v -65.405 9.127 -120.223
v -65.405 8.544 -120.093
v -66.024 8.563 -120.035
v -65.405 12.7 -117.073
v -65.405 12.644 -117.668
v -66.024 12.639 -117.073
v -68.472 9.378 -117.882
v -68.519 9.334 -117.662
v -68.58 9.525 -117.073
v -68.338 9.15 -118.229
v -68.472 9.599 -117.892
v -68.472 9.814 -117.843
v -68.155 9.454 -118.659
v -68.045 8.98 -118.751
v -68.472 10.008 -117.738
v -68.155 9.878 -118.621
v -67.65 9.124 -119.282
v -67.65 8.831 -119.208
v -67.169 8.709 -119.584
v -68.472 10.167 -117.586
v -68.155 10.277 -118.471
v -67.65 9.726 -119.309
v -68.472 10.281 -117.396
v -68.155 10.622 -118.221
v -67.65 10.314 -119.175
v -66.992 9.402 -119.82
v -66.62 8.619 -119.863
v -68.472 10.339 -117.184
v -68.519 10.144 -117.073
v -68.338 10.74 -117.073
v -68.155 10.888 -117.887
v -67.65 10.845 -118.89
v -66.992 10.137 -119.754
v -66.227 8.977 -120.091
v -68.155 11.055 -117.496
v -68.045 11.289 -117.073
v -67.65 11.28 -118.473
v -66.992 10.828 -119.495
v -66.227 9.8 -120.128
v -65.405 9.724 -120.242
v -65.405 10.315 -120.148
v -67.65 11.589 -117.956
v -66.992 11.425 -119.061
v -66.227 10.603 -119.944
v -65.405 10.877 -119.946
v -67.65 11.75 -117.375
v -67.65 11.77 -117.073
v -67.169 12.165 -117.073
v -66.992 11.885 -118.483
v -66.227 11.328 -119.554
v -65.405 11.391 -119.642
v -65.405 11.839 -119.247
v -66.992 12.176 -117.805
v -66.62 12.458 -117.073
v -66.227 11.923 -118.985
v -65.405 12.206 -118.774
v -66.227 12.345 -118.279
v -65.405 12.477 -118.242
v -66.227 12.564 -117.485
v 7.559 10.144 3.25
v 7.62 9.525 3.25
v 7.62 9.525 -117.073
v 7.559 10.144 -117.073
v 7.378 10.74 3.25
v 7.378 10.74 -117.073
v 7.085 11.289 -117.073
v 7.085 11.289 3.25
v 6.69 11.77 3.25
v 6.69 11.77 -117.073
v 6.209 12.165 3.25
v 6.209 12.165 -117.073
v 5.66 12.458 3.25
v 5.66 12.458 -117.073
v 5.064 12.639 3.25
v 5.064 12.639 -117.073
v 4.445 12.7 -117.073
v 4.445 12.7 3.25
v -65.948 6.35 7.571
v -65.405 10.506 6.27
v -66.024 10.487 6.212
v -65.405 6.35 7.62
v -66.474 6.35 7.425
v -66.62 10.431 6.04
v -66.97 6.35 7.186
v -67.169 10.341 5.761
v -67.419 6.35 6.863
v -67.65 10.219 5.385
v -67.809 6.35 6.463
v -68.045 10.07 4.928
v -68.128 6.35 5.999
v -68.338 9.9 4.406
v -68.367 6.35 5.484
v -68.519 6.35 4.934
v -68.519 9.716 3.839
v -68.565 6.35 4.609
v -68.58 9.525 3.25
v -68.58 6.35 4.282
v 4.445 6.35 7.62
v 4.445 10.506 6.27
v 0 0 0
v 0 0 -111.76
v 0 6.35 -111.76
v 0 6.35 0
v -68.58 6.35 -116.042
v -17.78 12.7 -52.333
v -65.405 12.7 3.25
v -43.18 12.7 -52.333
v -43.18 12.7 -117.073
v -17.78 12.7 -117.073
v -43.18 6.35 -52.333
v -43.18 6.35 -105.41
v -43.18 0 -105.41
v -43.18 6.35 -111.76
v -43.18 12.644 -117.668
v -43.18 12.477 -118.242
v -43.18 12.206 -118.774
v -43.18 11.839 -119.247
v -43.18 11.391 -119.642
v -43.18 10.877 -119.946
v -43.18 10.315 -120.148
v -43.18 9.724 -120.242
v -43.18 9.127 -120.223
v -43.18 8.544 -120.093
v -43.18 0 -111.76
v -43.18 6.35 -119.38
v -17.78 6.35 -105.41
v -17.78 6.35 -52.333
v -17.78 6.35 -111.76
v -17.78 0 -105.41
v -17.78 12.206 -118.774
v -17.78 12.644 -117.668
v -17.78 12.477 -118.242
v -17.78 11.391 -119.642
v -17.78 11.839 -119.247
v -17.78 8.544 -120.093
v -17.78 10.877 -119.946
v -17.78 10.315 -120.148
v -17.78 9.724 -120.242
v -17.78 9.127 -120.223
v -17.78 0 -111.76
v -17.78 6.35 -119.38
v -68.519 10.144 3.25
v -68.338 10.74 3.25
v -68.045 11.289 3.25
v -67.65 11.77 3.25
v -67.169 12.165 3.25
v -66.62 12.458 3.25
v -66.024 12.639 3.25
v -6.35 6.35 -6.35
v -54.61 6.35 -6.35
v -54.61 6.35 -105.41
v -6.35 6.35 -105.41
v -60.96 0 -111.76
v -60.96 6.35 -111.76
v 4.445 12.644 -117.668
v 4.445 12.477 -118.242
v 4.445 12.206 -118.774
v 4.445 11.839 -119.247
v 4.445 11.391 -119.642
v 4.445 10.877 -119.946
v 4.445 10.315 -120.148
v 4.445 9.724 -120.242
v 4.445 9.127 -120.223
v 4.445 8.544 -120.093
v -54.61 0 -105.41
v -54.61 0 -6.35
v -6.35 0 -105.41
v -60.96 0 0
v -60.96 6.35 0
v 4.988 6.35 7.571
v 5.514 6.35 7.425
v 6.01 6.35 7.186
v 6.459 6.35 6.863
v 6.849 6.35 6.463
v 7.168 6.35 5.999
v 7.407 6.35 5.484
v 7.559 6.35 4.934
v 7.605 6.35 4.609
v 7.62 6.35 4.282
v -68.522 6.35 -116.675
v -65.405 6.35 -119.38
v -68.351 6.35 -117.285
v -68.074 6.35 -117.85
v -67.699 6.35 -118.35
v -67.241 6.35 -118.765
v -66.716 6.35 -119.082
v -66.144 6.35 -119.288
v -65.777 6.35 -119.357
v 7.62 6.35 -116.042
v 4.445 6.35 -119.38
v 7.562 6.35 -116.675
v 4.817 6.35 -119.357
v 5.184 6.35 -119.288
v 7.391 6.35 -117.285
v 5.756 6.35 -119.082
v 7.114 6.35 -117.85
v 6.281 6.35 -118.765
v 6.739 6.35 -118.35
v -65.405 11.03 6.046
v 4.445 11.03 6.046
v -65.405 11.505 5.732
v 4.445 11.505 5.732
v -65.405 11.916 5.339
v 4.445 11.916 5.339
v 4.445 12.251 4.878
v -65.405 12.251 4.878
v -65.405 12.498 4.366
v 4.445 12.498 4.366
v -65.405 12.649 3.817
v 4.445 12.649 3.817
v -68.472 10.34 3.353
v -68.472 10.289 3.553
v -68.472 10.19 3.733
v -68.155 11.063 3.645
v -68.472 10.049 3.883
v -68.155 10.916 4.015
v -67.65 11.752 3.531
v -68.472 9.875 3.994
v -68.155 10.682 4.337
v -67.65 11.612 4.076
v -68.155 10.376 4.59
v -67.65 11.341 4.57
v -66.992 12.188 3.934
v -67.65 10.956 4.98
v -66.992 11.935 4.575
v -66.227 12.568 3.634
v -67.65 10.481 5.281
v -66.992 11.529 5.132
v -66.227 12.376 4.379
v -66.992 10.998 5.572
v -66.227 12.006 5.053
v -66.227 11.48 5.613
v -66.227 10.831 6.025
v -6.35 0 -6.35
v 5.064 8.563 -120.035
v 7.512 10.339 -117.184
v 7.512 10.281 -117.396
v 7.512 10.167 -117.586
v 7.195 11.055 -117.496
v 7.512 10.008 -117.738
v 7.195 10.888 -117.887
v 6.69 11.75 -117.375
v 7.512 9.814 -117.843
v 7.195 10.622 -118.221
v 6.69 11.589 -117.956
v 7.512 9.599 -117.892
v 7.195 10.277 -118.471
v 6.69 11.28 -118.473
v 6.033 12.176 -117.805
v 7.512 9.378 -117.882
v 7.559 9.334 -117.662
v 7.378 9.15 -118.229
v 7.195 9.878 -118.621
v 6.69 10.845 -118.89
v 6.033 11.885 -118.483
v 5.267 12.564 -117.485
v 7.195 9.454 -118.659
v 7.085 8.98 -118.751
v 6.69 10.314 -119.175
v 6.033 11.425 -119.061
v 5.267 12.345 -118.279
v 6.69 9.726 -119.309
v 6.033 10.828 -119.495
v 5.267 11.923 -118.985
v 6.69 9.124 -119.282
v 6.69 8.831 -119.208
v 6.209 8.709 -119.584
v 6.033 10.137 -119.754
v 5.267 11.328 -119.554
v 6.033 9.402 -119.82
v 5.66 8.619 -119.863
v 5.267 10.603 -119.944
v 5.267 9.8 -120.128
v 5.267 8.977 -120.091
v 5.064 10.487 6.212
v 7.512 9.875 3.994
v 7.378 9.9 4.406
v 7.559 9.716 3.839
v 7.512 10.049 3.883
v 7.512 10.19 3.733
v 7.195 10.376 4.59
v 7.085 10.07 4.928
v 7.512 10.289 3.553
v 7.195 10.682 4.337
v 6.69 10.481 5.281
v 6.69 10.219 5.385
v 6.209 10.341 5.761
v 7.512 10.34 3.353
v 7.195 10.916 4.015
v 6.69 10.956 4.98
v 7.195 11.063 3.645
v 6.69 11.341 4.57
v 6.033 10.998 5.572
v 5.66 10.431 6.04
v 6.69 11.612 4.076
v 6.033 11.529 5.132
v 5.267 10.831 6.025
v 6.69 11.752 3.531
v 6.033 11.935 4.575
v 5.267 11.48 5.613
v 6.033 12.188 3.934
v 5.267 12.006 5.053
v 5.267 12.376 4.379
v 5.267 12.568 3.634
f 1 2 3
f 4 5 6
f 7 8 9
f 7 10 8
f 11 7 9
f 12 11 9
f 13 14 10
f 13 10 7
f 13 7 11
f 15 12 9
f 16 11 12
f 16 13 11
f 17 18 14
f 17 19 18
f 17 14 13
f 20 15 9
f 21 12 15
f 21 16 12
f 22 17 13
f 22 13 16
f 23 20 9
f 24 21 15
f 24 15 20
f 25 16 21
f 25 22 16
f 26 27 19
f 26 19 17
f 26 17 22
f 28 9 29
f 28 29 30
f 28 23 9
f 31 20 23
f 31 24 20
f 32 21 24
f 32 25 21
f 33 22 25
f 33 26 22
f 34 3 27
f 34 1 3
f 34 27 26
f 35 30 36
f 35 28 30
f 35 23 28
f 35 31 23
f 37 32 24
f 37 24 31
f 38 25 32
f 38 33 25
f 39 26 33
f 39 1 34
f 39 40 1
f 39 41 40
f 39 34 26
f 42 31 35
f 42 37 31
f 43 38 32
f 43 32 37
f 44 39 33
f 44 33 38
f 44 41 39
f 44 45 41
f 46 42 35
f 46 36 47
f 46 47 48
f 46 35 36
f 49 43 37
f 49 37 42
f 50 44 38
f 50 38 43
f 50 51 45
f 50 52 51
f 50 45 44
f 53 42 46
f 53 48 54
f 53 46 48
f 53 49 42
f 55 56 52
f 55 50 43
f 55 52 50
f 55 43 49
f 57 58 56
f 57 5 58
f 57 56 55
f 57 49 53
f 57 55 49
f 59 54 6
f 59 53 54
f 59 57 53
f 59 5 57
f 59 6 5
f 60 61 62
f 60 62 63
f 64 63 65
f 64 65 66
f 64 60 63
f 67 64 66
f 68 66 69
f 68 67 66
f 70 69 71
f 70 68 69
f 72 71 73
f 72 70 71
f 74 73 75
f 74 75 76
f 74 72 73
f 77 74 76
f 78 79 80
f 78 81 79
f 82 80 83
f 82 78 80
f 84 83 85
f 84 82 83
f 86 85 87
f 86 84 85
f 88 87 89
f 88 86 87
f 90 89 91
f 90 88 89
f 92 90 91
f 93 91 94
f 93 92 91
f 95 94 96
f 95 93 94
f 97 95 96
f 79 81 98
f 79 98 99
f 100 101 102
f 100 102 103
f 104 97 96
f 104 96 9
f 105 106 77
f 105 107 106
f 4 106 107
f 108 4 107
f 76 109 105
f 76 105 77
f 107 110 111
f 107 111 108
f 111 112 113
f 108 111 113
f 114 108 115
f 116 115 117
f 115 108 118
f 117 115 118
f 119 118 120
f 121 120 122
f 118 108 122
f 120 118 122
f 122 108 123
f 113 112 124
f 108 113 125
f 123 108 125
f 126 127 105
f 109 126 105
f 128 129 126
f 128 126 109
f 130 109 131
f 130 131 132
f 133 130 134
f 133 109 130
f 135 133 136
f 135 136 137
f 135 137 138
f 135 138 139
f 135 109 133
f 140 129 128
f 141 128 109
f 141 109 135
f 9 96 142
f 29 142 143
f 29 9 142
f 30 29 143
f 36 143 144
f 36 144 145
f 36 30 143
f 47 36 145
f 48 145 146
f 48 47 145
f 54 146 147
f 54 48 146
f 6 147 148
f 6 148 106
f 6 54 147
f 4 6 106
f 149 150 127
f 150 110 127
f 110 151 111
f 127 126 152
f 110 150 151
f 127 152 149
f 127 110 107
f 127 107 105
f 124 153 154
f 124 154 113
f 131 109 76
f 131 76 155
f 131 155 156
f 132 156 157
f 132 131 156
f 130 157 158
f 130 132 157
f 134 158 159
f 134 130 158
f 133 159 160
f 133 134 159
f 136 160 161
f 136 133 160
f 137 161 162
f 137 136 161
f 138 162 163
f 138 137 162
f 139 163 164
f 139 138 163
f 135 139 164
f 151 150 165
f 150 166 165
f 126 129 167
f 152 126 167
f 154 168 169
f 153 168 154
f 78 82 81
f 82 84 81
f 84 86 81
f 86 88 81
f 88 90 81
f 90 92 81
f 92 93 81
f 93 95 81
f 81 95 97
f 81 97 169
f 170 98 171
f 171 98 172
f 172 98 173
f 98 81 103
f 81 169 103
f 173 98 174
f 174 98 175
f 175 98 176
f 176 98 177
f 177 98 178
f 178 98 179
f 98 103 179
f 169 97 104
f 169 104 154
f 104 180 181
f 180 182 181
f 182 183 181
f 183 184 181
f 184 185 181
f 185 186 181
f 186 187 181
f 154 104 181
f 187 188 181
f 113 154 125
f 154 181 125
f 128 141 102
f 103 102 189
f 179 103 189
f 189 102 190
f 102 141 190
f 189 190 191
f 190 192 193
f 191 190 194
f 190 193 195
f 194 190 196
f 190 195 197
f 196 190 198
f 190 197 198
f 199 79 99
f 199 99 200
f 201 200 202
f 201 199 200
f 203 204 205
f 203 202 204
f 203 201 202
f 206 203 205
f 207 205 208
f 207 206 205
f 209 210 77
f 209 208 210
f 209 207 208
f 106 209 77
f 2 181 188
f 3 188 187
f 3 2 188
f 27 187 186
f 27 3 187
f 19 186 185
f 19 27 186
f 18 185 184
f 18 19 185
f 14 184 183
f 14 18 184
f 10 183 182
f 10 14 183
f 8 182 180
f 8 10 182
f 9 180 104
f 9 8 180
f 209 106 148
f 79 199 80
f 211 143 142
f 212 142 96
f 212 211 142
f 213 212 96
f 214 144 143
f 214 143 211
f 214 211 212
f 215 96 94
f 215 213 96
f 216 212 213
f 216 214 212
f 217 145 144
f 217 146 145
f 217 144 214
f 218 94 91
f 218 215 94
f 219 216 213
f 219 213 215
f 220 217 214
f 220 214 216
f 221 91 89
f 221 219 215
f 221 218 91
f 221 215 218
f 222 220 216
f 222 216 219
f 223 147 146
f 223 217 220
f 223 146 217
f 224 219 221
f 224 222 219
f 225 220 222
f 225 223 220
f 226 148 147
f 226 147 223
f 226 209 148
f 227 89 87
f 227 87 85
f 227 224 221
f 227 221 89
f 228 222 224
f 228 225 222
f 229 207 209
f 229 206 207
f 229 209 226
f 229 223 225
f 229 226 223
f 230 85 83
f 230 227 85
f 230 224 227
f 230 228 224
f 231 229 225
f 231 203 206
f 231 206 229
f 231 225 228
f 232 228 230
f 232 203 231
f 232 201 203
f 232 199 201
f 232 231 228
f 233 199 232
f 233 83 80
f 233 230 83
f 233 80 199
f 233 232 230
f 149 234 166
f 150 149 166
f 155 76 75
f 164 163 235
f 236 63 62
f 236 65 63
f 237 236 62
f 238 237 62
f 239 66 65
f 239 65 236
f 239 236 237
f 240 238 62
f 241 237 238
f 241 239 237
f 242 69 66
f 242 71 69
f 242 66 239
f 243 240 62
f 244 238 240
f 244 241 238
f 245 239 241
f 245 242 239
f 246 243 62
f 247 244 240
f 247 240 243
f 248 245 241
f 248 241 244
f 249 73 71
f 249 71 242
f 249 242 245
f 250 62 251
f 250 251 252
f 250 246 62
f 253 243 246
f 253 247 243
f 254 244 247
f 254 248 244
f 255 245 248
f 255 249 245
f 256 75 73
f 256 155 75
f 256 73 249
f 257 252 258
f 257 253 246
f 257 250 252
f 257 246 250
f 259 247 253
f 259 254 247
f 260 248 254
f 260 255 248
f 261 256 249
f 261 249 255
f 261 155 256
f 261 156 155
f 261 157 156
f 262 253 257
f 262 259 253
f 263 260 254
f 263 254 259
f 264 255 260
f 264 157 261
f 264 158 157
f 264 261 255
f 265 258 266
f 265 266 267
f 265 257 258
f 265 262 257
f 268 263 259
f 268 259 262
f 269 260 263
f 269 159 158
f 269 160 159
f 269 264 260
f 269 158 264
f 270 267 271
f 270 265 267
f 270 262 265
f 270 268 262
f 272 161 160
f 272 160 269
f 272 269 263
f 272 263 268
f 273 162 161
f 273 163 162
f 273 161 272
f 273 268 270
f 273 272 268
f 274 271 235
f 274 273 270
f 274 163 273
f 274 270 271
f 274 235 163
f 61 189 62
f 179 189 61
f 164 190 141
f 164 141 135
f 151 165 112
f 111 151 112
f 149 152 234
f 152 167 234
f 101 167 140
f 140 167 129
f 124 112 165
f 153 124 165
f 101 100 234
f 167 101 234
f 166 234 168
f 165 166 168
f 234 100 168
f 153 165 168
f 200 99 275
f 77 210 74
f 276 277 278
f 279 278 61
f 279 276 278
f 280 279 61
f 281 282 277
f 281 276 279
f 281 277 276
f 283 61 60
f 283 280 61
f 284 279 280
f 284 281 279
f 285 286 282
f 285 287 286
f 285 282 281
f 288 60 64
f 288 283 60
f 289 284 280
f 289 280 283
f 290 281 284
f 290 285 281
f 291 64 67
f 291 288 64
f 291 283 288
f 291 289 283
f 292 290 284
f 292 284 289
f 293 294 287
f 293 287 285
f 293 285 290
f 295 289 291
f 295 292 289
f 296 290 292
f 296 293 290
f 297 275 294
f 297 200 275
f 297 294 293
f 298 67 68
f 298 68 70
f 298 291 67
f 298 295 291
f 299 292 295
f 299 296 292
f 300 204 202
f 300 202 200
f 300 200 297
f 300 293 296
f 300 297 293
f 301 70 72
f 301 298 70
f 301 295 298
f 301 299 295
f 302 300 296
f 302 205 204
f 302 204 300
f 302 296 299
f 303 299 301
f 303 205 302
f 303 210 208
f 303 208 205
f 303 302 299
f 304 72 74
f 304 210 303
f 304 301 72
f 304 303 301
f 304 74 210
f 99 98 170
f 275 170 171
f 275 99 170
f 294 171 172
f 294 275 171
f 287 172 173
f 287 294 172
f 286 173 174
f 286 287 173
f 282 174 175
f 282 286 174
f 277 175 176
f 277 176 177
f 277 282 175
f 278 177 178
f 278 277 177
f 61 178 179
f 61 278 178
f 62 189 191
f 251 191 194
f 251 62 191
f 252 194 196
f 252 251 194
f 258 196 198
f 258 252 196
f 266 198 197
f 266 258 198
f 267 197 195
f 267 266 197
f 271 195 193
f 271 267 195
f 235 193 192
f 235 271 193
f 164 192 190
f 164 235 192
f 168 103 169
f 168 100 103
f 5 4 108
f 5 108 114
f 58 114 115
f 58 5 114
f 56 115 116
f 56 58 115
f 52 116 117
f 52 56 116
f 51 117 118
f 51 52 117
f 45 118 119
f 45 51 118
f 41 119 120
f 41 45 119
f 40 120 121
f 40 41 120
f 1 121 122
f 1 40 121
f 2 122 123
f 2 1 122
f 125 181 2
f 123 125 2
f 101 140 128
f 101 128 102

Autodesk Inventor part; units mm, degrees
ref_plane "YZ Plane" through (0, 0, 0) normal (1, 0, 0) x (0, 1, 0)
ref_plane "XZ Plane" through (0, 0, 0) normal (0, 1, 0) x (-1, 0, 0)
ref_plane "XY Plane" through (0, 0, 0) normal (0, 0, 1) x (1, 0, 0)
sketch "Sketch1" plane through (0, 0, 0) normal (0, 1, 0) x (-1, 0, 0)
  line L0 (0, 0) -> (60.96, 0)
  line L1 (60.96, 0) -> (60.96, -111.76)
  line L2 (60.96, -111.76) -> (0, -111.76)
  line L3 (0, -111.76) -> (0, 0)
  dimension "d0" = 60.96
  dimension "d1" = 111.76
extrude "Extrusion1" add sketch "Sketch1" along normal blind 6.35
sketch "Sketch2" plane through (0, 6.35, 0) normal (0, 1, 0) x (1, 0, 0)
  line L0 (-60.96, 0) -> (0, 0) projected
  line L1 (0, 0) -> (0, 111.76) projected
  line L2 (0, 111.76) -> (-60.96, 111.76) projected
  line L3 (-60.96, 111.76) -> (-60.96, 0) projected
  line L4 (7.62, -7.62) -> (-68.58, -7.62)
  line L5 (-68.58, -7.62) -> (-68.58, 119.38)
  line L6 (-68.58, 119.38) -> (7.62, 119.38)
  line L7 (7.62, 119.38) -> (7.62, -7.62)
  dimension "d4" = 7.62
extrude "Extrusion2" add sketch "Sketch2" along normal blind 6.35 contours L3 L2 L1 L0 | L4 L5 L6 L7
sketch "Sketch3" plane through (7.62, 6.35, 7.62) normal (1, 0, 0) x (0, 0, -1)
  line L0 (127, 0) -> (127, 6.35) projected
  line L1 (127, 0) -> (129.0632, 6.35)
  line L2 (127, 0) -> (136.5189, 0) construction
  line L3 (127, 6.35) -> (129.0632, 6.35)
  line L4 (0, 0) -> (0, 6.35) projected
  line L5 (0, 0) -> (2.0632, 6.35)
  line L6 (127, 6.35) -> (0, 6.35) projected
  line L7 (127, 0) -> (0, 0) projected
  line L8 (127, 0) -> (127, 6.35) projected
  line L9 (0, 6.35) -> (127, 6.35) projected
  line L10 (0, 0) -> (0, 6.35) projected
  point P0 (7.62, -6.35)
  dimension "d7" = 72
extrude "Extrusion3" add sketch "Sketch3" against normal blind 76.2 contours L0 L3 L1 | L4 L6 L5
sketch "Sketch4" plane through (7.62, 6.35, 7.62) normal (1, 0, 0) x (0, 0, -1)
  line L0 (0, 0) -> (2.0632, 6.35)
  line L1 (0, 0) -> (11.0448, 0) construction
  line L2 (0, 0) -> (0, 6.35) projected
  line L3 (0, 6.35) -> (129.0632, 6.35) projected
  point P0 (7.62, -6.35)
  dimension "d10" = 72
extrude "Extrusion4" cut sketch "Sketch4" against normal through all
fillet "Fillet2" radius 3.175 8 edges at (-68.58, 12.7, -57.9432) (-30.48, 12.7, -121.4432) (7.62, 12.7, -57.9432) (-68.58, 9.525, -120.4116) (7.62, 9.525, -120.4116) (7.62, 9.525, 6.5884) (-68.58, 9.525, 6.5884) (-30.48, 12.7, 5.5568)
sketch "Sketch5" plane through (0, 0, 0) normal (0, -1, 0) x (1, 0, 0)
  line L0 (0, 0) -> (-60.96, 0) projected
  line L1 (-60.96, 0) -> (-60.96, -111.76) projected
  line L2 (-60.96, -111.76) -> (0, -111.76) projected
  line L3 (0, -111.76) -> (0, 0) projected
  line L4 (-6.35, -6.35) -> (-54.61, -6.35)
  line L5 (-54.61, -6.35) -> (-54.61, -105.41)
  line L6 (-54.61, -105.41) -> (-6.35, -105.41)
  line L7 (-6.35, -105.41) -> (-6.35, -6.35)
  dimension "d16" = 6.35
extrude "Extrusion5" cut sketch "Sketch5" against normal blind 6.35 contours L7 L6 L5 L4
sketch "Sketch6" plane through (0, 0, 0) normal (0, -1, 0) x (1, 0, 0)
  line L0 (-60.96, -111.76) -> (0, -111.76) projected
  line L1 (-30.48, -111.76) -> (-17.78, -111.76)
  line L2 (-6.35, -105.41) -> (-54.61, -105.41) projected
  line L3 (-17.78, -111.76) -> (-43.18, -111.76)
  line L4 (-43.18, -111.76) -> (-43.18, -105.41)
  line L5 (-43.18, -105.41) -> (-17.78, -105.41)
  line L6 (-17.78, -105.41) -> (-17.78, -111.76)
  point P0 (0, 0)
  dimension "d19" = 12.7
  dimension "d20" = 25.4
extrude "Extrusion6" cut sketch "Sketch6" against normal blind 6.35
sketch "Sketch7" plane through (0, 6.35, 0) normal (0, -1, 0) x (1, 0, 0)
  line L0 (-17.78, -105.41) -> (-17.78, -111.76) projected
  line L1 (-17.78, -111.76) -> (-43.18, -111.76)
  line L2 (-43.18, -111.76) -> (-43.18, -142.1145)
  line L3 (-43.18, -142.1145) -> (-17.78, -142.1145)
  line L4 (-17.78, -142.1145) -> (-17.78, -111.76)
  line L5 (-43.18, -142.1145) -> (-17.78, -142.1145)
  line L6 (-17.78, -142.1145) -> (-17.78, -89.8971)
  line L7 (-17.78, -89.8971) -> (-43.18, -89.8971)
  line L8 (-43.18, -89.8971) -> (-43.18, -142.1145)
  point P0 (0, 0)
extrude "Extrusion7" cut sketch "Sketch7" against normal blind 25.4
sketch "Sketch8" plane through (0, 6.35, 0) normal (0, -1, 0) x (1, 0, 0)
  line L0 (-43.18, -89.8971) -> (-17.78, -89.8971) projected
  line L1 (-17.78, -89.8971) -> (-43.18, -89.8971)
  line L2 (-43.18, -89.8971) -> (-43.18, -52.3331)
  line L3 (-43.18, -52.3331) -> (-17.78, -52.3331)
  line L4 (-17.78, -52.3331) -> (-17.78, -89.8971)
  point P0 (0, 0)
extrude "Extrusion8" cut sketch "Sketch8" against normal blind 25.4
properties part number "Lid"
